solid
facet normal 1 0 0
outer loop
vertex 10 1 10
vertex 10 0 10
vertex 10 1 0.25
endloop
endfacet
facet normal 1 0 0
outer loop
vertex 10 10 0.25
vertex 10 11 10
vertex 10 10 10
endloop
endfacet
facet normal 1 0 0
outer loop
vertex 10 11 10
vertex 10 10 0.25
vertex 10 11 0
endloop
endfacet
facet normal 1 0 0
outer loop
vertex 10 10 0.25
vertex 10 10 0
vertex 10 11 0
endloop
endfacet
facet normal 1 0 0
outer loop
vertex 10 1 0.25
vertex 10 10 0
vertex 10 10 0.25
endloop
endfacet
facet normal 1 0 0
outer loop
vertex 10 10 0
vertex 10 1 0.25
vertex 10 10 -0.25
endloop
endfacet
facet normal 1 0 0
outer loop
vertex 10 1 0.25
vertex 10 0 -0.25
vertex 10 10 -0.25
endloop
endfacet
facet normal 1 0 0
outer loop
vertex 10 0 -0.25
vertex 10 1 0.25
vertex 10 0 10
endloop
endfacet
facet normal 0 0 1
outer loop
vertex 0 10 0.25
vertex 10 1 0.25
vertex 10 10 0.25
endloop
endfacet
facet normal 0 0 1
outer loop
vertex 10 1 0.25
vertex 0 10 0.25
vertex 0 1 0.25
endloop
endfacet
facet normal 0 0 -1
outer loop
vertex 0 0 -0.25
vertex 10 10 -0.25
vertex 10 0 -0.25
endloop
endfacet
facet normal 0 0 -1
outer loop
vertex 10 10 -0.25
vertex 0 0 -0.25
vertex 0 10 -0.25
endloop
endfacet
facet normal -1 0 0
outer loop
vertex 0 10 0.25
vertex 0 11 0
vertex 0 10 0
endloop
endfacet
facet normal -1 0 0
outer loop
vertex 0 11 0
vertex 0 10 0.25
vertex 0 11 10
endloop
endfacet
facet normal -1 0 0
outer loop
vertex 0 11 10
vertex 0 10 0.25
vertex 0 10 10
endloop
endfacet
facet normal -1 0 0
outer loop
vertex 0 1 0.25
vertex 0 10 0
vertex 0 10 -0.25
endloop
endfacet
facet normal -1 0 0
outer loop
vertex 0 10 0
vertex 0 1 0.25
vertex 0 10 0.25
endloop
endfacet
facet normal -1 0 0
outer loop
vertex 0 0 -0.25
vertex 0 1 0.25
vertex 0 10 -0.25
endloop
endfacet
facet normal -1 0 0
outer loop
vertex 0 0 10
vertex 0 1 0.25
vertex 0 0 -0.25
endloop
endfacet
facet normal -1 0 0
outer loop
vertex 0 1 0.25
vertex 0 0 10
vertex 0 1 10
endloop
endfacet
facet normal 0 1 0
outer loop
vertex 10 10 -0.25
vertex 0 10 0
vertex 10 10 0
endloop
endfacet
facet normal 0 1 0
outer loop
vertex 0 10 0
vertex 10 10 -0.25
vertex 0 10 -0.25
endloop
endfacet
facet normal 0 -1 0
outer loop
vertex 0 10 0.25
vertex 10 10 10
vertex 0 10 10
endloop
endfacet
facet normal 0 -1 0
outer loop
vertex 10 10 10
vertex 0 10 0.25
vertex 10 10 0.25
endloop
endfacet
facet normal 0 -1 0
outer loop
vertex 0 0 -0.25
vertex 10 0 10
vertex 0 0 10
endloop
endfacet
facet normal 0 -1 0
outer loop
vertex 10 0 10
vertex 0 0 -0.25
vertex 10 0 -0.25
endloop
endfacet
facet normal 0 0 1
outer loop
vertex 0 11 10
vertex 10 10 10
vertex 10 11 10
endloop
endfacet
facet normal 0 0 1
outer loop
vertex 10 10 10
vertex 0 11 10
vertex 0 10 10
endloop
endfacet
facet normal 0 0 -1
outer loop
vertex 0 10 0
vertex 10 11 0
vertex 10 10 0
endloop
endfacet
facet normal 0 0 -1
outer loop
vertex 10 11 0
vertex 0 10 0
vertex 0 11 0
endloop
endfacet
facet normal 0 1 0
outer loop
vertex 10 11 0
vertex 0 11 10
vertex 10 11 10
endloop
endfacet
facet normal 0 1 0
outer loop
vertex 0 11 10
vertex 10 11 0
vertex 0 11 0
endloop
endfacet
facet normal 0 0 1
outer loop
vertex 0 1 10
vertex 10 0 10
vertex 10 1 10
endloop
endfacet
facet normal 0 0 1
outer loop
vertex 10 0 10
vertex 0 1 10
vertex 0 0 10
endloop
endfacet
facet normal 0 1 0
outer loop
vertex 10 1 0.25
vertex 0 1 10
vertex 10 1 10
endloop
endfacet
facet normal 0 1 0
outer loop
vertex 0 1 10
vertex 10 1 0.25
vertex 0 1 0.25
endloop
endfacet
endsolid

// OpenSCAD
module makeRoom(cube_size) {
    translate([cube_size / 2, cube_size / 2, 0])
    cube([cube_size, cube_size, 0.5], center = true);
    translate([0, cube_size, 0])
    cube([cube_size, 1, cube_size]);
    cube([cube_size, 1, cube_size]);
}
makeRoom(10);
